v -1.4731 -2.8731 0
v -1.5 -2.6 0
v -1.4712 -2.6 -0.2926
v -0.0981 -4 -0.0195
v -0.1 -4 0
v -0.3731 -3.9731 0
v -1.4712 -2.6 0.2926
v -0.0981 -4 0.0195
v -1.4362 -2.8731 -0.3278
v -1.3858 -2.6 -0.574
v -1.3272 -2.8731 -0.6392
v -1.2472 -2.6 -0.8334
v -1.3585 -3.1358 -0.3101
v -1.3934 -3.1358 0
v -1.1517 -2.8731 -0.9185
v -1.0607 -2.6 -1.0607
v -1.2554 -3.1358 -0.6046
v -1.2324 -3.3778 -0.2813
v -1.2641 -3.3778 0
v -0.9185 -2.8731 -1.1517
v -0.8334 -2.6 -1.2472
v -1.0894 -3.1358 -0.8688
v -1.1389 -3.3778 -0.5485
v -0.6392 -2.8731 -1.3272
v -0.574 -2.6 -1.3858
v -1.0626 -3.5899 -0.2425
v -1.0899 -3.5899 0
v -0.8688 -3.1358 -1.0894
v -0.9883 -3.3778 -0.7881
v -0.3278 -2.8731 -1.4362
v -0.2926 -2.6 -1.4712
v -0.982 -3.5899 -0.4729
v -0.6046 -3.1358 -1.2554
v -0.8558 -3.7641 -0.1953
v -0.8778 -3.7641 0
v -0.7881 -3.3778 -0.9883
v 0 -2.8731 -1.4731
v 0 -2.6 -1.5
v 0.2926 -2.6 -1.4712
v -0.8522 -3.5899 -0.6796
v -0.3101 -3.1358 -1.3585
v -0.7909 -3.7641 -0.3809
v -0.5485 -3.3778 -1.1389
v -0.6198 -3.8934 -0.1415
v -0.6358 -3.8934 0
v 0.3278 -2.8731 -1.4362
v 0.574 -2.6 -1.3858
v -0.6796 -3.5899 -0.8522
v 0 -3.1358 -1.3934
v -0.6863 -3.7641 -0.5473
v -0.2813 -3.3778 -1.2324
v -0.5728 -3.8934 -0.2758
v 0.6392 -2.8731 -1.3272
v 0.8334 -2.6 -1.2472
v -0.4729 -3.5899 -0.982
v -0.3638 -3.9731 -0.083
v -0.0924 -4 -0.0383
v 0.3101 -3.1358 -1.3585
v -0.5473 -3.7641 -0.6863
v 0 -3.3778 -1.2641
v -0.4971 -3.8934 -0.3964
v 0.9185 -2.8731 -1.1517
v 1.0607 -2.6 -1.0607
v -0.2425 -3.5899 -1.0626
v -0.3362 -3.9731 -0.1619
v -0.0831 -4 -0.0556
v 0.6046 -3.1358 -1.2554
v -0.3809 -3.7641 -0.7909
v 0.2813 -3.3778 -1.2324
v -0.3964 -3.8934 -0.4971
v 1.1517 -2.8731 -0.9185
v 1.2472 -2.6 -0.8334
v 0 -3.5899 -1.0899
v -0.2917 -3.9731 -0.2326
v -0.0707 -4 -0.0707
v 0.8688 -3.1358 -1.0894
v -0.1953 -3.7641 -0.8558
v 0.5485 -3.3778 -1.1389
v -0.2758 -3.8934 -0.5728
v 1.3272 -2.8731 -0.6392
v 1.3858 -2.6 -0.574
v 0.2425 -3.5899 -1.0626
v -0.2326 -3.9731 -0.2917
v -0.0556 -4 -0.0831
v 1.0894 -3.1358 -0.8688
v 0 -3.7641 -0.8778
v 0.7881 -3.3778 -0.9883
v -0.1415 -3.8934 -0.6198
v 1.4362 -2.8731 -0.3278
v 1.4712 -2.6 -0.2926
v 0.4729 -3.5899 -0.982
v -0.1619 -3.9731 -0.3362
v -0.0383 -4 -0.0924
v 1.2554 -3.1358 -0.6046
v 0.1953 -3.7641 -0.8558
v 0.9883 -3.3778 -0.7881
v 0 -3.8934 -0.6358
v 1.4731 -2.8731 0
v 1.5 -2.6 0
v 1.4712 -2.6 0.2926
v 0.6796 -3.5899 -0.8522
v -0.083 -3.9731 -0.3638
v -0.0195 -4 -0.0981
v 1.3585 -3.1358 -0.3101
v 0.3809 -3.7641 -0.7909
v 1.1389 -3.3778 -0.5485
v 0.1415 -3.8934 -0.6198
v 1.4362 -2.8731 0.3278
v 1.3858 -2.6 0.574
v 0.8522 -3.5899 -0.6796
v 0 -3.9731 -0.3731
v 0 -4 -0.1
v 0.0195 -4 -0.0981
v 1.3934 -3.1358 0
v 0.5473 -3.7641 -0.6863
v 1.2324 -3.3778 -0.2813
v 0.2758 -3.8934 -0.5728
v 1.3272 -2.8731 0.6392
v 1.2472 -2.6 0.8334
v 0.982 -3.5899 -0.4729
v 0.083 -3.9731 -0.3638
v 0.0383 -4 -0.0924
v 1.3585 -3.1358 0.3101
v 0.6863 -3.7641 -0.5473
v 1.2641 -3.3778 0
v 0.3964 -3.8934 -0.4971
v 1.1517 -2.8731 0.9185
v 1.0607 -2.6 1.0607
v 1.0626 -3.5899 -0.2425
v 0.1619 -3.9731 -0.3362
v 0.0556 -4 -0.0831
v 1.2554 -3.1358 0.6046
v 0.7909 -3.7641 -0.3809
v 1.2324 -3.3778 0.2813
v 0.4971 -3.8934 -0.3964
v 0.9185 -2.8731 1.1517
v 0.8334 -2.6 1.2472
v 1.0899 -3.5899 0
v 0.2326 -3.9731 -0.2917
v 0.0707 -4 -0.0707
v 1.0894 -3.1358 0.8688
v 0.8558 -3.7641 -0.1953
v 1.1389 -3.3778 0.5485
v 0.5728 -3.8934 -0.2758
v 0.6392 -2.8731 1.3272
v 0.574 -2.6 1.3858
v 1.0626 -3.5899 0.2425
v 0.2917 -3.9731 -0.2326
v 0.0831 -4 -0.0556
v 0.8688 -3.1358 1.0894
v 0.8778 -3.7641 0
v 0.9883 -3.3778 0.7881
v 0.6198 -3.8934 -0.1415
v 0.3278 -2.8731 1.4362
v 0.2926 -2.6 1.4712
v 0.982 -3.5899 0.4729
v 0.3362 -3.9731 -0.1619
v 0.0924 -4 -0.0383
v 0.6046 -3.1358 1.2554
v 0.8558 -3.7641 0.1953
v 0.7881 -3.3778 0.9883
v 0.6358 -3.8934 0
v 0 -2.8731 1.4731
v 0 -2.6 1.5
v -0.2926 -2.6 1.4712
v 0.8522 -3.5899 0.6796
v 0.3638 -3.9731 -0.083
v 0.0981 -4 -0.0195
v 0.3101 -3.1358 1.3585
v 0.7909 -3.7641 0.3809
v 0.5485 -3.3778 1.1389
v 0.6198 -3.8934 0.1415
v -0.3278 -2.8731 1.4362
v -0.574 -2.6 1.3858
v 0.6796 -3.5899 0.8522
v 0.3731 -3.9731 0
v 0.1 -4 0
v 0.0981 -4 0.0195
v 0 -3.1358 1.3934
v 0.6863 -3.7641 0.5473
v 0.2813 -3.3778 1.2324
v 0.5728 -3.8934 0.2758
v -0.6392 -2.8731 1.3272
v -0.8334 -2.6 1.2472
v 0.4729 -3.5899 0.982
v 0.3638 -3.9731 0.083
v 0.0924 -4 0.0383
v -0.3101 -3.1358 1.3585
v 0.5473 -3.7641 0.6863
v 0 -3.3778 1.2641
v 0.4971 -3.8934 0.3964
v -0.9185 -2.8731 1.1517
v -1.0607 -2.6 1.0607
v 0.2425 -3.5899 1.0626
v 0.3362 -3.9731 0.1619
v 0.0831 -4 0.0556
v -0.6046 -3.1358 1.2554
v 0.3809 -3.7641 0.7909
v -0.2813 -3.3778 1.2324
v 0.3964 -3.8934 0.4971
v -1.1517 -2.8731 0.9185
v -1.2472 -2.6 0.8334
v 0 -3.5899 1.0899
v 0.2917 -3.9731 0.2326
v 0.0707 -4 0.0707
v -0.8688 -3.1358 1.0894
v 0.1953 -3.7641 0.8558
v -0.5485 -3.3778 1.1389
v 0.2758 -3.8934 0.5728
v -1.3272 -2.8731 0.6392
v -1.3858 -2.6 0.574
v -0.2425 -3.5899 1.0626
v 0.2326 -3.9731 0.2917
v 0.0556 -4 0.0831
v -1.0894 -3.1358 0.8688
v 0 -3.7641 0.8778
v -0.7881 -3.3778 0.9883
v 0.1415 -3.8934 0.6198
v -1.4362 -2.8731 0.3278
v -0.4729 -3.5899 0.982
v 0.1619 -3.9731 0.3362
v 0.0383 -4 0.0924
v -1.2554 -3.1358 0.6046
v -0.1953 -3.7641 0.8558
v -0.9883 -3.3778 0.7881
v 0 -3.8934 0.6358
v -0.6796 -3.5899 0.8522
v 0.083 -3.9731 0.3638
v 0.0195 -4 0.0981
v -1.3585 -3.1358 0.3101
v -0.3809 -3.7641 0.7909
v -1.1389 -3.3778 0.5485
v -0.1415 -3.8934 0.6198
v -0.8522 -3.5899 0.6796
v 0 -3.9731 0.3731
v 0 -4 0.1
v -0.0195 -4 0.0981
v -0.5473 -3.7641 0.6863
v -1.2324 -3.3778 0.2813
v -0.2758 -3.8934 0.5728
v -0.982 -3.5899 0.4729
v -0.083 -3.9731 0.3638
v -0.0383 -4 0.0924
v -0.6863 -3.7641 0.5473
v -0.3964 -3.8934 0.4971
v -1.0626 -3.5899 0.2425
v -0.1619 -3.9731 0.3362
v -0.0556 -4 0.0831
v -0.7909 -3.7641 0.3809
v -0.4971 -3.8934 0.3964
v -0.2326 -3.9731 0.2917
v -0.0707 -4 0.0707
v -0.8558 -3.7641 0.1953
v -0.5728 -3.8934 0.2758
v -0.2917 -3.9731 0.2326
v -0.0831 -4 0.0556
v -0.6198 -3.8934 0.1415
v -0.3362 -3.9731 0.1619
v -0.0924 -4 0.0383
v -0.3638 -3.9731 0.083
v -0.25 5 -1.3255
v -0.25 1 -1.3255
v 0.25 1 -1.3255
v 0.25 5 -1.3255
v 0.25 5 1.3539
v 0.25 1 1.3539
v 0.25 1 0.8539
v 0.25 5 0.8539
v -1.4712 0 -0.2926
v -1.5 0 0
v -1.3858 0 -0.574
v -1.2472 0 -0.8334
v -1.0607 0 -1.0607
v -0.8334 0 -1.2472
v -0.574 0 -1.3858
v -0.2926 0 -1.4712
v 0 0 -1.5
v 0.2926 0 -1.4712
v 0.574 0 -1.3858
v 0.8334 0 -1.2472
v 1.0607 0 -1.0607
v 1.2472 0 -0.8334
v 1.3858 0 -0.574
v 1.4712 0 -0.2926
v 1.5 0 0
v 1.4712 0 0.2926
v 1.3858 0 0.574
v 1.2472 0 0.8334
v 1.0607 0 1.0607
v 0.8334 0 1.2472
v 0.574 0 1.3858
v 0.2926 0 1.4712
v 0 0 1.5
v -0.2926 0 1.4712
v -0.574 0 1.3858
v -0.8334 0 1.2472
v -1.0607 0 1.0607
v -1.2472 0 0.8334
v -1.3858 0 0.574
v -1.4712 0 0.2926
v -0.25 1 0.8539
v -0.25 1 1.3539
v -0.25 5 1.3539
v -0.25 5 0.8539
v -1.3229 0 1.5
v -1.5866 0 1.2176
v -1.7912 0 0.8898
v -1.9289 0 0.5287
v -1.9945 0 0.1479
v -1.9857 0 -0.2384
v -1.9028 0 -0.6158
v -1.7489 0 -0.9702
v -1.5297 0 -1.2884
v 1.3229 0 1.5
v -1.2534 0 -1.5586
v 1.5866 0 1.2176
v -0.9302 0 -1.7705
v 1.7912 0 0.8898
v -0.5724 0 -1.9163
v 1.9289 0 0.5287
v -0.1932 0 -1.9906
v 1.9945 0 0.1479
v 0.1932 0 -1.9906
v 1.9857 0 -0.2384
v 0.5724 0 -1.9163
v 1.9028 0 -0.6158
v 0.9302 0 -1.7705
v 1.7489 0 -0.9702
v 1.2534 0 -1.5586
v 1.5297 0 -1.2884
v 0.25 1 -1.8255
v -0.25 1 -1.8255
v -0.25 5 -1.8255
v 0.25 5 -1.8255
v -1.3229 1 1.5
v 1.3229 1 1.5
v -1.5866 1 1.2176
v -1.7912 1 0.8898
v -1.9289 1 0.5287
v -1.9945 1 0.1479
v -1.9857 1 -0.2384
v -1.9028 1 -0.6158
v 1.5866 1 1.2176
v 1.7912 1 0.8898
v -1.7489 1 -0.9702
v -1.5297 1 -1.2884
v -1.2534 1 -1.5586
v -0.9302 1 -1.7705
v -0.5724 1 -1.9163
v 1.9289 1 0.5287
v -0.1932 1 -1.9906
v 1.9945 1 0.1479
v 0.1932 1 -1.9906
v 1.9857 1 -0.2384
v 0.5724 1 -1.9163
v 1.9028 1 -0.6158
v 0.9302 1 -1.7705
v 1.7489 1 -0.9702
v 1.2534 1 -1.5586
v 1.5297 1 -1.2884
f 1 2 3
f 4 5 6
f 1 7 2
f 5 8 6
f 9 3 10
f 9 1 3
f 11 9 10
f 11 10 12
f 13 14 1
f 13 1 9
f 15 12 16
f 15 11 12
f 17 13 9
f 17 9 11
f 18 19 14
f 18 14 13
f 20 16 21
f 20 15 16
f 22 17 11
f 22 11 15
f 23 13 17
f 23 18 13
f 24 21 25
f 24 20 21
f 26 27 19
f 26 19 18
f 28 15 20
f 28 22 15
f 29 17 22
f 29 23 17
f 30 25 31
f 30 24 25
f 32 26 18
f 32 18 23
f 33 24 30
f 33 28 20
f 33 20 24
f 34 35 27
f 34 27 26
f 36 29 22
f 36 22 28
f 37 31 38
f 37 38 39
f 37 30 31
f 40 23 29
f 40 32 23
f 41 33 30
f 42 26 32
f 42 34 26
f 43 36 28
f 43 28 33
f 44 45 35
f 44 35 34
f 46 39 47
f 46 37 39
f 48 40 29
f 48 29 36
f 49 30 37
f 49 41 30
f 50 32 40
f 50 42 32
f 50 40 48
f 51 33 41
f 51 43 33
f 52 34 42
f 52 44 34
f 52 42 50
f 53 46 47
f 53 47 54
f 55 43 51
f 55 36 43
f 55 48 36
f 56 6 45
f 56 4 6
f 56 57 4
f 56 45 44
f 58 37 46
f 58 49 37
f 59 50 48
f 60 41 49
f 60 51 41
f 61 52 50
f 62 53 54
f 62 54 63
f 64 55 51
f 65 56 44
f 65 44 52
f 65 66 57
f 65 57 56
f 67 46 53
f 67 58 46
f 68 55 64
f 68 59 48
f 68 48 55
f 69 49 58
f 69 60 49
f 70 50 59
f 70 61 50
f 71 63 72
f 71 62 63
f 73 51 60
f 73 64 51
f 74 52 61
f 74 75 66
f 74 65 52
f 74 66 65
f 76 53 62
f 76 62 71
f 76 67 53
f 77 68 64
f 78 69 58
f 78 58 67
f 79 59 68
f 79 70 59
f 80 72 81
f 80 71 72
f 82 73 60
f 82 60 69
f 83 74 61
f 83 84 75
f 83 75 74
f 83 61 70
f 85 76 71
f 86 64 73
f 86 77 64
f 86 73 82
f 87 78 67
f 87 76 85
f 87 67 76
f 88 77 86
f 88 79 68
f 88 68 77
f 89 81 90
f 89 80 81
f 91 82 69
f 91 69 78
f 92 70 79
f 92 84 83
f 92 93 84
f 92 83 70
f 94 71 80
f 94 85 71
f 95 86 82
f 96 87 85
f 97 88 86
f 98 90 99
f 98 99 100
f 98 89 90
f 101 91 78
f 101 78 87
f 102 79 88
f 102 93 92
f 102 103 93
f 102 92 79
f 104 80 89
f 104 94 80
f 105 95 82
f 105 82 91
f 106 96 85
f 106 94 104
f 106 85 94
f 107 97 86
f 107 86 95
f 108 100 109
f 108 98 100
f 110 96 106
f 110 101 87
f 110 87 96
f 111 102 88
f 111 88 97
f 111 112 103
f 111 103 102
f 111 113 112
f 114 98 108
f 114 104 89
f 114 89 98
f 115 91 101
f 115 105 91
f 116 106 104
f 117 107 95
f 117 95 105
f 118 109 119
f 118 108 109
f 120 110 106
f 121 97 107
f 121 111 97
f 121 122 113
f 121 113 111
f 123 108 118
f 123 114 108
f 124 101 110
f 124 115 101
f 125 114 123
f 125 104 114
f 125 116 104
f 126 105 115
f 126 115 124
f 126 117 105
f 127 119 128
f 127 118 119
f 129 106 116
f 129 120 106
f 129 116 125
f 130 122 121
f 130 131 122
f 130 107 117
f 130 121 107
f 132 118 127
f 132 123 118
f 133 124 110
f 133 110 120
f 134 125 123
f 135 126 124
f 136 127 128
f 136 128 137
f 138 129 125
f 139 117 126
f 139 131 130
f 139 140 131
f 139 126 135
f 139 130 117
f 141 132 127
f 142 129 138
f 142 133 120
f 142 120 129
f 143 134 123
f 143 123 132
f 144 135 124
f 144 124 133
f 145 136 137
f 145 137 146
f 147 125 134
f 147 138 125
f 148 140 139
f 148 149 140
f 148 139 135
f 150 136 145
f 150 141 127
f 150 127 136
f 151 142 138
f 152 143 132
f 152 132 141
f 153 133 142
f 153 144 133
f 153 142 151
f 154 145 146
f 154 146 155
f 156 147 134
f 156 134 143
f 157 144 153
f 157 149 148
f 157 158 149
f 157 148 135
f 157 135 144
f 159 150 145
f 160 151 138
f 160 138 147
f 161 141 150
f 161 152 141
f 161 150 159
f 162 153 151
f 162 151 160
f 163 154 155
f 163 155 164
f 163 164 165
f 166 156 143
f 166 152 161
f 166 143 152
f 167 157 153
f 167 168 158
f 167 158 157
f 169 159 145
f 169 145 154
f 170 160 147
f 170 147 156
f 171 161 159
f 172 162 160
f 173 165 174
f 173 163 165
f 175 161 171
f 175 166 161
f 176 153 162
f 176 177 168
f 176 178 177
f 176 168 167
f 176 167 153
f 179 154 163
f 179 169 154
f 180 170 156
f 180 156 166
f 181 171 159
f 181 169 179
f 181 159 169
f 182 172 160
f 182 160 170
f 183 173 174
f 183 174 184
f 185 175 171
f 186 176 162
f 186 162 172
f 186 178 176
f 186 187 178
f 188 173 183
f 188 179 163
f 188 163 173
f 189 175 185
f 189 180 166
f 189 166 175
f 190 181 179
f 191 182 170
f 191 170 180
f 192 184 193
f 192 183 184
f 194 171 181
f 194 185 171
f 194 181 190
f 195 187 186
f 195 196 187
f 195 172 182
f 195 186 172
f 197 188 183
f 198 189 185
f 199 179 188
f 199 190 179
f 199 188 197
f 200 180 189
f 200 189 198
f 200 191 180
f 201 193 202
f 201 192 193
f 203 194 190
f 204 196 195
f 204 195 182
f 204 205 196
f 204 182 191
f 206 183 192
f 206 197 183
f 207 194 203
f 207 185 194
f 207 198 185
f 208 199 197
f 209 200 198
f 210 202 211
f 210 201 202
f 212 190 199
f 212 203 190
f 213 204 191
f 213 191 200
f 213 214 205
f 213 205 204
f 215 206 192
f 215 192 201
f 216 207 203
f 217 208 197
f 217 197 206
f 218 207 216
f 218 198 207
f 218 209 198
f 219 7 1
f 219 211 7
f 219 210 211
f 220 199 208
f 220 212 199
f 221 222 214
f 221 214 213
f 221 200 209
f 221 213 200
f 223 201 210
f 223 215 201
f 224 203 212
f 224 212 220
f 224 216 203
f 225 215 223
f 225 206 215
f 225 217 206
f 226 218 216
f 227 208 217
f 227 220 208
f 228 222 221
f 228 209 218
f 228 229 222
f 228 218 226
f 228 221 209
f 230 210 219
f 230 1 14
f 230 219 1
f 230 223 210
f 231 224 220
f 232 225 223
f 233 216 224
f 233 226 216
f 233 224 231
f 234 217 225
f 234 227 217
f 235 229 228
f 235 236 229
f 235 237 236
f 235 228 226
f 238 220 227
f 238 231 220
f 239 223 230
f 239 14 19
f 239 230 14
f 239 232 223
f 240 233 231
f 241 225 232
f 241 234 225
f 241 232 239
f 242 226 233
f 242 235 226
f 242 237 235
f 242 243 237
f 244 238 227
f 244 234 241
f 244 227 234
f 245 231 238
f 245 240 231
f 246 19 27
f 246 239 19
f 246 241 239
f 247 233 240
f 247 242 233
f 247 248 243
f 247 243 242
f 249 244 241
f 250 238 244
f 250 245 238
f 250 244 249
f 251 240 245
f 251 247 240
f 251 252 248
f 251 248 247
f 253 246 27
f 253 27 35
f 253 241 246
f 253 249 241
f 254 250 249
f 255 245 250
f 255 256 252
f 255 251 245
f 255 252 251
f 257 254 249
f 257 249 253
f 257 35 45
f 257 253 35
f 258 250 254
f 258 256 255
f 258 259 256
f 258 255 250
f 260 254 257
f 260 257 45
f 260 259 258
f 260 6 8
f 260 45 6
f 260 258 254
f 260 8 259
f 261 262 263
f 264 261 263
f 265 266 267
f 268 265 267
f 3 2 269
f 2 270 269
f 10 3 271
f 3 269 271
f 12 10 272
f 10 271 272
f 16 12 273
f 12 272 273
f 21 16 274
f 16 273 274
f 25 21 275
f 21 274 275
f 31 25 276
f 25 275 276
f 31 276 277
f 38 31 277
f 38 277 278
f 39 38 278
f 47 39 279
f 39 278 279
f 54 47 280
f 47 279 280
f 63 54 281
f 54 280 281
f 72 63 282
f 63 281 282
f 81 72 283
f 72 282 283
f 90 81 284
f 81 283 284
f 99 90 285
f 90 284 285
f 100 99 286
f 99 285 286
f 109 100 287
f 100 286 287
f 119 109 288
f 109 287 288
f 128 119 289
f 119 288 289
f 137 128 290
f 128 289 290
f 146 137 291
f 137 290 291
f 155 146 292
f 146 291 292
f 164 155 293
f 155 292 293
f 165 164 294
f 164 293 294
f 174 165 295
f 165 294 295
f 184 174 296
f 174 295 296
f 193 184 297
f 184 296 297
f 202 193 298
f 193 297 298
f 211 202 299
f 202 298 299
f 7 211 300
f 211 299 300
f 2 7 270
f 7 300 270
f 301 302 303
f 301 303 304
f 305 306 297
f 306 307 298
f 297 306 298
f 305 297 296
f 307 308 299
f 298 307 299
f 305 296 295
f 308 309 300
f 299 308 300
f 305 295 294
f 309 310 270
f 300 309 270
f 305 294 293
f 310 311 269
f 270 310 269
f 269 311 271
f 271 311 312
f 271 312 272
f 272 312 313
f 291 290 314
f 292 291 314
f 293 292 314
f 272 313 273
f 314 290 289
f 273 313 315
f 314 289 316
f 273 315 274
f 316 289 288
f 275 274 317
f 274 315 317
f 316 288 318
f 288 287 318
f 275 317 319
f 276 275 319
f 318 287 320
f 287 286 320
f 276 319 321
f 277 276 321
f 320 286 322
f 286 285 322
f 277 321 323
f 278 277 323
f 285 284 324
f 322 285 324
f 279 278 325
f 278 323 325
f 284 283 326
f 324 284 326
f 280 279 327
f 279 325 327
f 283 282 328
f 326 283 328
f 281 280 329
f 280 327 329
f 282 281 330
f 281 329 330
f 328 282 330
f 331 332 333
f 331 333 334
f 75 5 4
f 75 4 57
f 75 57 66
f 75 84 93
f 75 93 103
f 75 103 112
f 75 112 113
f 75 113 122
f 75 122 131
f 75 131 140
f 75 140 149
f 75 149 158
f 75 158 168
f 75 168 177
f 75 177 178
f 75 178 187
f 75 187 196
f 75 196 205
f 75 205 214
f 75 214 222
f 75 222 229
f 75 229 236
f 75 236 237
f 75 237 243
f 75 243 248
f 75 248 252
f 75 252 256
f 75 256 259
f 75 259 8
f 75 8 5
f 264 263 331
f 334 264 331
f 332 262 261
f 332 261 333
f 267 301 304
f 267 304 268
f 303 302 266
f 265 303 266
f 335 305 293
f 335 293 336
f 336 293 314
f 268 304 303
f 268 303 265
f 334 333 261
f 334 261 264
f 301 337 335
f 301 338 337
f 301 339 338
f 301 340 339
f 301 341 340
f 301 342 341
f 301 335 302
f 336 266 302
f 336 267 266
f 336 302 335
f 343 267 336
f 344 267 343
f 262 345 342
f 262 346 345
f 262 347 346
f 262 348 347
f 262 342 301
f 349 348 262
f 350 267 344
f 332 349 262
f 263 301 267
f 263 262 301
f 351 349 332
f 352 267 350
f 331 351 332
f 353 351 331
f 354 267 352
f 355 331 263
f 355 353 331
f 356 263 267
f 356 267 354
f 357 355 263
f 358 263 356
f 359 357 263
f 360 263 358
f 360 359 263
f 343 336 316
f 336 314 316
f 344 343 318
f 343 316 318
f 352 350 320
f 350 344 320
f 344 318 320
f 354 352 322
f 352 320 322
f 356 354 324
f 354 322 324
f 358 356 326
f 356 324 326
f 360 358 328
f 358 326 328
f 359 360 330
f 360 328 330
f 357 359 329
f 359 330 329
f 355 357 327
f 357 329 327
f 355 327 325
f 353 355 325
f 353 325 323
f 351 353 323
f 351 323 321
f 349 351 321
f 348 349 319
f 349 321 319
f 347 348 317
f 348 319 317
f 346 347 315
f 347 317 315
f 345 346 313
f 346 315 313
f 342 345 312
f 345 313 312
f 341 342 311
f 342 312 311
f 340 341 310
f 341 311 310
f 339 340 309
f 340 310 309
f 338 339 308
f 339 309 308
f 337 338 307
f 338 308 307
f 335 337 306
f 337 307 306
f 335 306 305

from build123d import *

# Parameters (mm, degrees)
SKETCH_1_R          = 2
EXTRUDE_1_DEPTH     = 1
SKETCH_2_R          = 1.5
EXTRUDE_2_DEPTH     = 4
FILLET_1_R          = 1.4
CUT_EXTRUDE_1_DEPTH = 4
SKETCH_4_W          = 0.5
SKETCH_4_H          = 0.5
EXTRUDE_3_DEPTH     = 4


with BuildPart() as part:
    # Эскиз1 → Бобышка-Вытянуть1 (new body)
    with BuildSketch(Plane(origin=(0, 0, 0), x_dir=(1, 0, 0), z_dir=(0, 1, 0))):
        Circle(SKETCH_1_R)
    extrude(amount=EXTRUDE_1_DEPTH)

    # Эскиз2 → Бобышка-Вытянуть2 (add)
    with BuildSketch(Plane(origin=(0, 0, 0), x_dir=(-1, 0, 0), z_dir=(0, -1, 0))):
        Circle(SKETCH_2_R)
    extrude(amount=EXTRUDE_2_DEPTH)

    # Скругление1
    fillet_1_edges = [part.edges().sort_by_distance(p)[0] for p in [
        (1.5, -4, 0),
    ]]
    fillet(fillet_1_edges, radius=FILLET_1_R)

    # Эскиз3 → Вырез-Вытянуть1 (cut)
    with BuildSketch(Plane.XZ):
        with BuildLine():
            Line((-1.322875656, 1.5), (1.322875656, 1.5))
            ThreePointArc((1.322875656, 1.5), (0, 2), (-1.322875656, 1.5))
        make_face()
    extrude(amount=-CUT_EXTRUDE_1_DEPTH, mode=Mode.SUBTRACT)

    # Эскиз4 → Бобышка-Вытянуть3 (add)
    with BuildSketch(Plane(origin=(0, 1, 0), x_dir=(1, 0, 0), z_dir=(0, 1, 0))):
        with Locations((0, -1.103924033)):
            Rectangle(SKETCH_4_W, SKETCH_4_H)
        with Locations((0, 1.575495182)):
            Rectangle(SKETCH_4_W, SKETCH_4_H)
    extrude(amount=EXTRUDE_3_DEPTH)


solid = part.part
